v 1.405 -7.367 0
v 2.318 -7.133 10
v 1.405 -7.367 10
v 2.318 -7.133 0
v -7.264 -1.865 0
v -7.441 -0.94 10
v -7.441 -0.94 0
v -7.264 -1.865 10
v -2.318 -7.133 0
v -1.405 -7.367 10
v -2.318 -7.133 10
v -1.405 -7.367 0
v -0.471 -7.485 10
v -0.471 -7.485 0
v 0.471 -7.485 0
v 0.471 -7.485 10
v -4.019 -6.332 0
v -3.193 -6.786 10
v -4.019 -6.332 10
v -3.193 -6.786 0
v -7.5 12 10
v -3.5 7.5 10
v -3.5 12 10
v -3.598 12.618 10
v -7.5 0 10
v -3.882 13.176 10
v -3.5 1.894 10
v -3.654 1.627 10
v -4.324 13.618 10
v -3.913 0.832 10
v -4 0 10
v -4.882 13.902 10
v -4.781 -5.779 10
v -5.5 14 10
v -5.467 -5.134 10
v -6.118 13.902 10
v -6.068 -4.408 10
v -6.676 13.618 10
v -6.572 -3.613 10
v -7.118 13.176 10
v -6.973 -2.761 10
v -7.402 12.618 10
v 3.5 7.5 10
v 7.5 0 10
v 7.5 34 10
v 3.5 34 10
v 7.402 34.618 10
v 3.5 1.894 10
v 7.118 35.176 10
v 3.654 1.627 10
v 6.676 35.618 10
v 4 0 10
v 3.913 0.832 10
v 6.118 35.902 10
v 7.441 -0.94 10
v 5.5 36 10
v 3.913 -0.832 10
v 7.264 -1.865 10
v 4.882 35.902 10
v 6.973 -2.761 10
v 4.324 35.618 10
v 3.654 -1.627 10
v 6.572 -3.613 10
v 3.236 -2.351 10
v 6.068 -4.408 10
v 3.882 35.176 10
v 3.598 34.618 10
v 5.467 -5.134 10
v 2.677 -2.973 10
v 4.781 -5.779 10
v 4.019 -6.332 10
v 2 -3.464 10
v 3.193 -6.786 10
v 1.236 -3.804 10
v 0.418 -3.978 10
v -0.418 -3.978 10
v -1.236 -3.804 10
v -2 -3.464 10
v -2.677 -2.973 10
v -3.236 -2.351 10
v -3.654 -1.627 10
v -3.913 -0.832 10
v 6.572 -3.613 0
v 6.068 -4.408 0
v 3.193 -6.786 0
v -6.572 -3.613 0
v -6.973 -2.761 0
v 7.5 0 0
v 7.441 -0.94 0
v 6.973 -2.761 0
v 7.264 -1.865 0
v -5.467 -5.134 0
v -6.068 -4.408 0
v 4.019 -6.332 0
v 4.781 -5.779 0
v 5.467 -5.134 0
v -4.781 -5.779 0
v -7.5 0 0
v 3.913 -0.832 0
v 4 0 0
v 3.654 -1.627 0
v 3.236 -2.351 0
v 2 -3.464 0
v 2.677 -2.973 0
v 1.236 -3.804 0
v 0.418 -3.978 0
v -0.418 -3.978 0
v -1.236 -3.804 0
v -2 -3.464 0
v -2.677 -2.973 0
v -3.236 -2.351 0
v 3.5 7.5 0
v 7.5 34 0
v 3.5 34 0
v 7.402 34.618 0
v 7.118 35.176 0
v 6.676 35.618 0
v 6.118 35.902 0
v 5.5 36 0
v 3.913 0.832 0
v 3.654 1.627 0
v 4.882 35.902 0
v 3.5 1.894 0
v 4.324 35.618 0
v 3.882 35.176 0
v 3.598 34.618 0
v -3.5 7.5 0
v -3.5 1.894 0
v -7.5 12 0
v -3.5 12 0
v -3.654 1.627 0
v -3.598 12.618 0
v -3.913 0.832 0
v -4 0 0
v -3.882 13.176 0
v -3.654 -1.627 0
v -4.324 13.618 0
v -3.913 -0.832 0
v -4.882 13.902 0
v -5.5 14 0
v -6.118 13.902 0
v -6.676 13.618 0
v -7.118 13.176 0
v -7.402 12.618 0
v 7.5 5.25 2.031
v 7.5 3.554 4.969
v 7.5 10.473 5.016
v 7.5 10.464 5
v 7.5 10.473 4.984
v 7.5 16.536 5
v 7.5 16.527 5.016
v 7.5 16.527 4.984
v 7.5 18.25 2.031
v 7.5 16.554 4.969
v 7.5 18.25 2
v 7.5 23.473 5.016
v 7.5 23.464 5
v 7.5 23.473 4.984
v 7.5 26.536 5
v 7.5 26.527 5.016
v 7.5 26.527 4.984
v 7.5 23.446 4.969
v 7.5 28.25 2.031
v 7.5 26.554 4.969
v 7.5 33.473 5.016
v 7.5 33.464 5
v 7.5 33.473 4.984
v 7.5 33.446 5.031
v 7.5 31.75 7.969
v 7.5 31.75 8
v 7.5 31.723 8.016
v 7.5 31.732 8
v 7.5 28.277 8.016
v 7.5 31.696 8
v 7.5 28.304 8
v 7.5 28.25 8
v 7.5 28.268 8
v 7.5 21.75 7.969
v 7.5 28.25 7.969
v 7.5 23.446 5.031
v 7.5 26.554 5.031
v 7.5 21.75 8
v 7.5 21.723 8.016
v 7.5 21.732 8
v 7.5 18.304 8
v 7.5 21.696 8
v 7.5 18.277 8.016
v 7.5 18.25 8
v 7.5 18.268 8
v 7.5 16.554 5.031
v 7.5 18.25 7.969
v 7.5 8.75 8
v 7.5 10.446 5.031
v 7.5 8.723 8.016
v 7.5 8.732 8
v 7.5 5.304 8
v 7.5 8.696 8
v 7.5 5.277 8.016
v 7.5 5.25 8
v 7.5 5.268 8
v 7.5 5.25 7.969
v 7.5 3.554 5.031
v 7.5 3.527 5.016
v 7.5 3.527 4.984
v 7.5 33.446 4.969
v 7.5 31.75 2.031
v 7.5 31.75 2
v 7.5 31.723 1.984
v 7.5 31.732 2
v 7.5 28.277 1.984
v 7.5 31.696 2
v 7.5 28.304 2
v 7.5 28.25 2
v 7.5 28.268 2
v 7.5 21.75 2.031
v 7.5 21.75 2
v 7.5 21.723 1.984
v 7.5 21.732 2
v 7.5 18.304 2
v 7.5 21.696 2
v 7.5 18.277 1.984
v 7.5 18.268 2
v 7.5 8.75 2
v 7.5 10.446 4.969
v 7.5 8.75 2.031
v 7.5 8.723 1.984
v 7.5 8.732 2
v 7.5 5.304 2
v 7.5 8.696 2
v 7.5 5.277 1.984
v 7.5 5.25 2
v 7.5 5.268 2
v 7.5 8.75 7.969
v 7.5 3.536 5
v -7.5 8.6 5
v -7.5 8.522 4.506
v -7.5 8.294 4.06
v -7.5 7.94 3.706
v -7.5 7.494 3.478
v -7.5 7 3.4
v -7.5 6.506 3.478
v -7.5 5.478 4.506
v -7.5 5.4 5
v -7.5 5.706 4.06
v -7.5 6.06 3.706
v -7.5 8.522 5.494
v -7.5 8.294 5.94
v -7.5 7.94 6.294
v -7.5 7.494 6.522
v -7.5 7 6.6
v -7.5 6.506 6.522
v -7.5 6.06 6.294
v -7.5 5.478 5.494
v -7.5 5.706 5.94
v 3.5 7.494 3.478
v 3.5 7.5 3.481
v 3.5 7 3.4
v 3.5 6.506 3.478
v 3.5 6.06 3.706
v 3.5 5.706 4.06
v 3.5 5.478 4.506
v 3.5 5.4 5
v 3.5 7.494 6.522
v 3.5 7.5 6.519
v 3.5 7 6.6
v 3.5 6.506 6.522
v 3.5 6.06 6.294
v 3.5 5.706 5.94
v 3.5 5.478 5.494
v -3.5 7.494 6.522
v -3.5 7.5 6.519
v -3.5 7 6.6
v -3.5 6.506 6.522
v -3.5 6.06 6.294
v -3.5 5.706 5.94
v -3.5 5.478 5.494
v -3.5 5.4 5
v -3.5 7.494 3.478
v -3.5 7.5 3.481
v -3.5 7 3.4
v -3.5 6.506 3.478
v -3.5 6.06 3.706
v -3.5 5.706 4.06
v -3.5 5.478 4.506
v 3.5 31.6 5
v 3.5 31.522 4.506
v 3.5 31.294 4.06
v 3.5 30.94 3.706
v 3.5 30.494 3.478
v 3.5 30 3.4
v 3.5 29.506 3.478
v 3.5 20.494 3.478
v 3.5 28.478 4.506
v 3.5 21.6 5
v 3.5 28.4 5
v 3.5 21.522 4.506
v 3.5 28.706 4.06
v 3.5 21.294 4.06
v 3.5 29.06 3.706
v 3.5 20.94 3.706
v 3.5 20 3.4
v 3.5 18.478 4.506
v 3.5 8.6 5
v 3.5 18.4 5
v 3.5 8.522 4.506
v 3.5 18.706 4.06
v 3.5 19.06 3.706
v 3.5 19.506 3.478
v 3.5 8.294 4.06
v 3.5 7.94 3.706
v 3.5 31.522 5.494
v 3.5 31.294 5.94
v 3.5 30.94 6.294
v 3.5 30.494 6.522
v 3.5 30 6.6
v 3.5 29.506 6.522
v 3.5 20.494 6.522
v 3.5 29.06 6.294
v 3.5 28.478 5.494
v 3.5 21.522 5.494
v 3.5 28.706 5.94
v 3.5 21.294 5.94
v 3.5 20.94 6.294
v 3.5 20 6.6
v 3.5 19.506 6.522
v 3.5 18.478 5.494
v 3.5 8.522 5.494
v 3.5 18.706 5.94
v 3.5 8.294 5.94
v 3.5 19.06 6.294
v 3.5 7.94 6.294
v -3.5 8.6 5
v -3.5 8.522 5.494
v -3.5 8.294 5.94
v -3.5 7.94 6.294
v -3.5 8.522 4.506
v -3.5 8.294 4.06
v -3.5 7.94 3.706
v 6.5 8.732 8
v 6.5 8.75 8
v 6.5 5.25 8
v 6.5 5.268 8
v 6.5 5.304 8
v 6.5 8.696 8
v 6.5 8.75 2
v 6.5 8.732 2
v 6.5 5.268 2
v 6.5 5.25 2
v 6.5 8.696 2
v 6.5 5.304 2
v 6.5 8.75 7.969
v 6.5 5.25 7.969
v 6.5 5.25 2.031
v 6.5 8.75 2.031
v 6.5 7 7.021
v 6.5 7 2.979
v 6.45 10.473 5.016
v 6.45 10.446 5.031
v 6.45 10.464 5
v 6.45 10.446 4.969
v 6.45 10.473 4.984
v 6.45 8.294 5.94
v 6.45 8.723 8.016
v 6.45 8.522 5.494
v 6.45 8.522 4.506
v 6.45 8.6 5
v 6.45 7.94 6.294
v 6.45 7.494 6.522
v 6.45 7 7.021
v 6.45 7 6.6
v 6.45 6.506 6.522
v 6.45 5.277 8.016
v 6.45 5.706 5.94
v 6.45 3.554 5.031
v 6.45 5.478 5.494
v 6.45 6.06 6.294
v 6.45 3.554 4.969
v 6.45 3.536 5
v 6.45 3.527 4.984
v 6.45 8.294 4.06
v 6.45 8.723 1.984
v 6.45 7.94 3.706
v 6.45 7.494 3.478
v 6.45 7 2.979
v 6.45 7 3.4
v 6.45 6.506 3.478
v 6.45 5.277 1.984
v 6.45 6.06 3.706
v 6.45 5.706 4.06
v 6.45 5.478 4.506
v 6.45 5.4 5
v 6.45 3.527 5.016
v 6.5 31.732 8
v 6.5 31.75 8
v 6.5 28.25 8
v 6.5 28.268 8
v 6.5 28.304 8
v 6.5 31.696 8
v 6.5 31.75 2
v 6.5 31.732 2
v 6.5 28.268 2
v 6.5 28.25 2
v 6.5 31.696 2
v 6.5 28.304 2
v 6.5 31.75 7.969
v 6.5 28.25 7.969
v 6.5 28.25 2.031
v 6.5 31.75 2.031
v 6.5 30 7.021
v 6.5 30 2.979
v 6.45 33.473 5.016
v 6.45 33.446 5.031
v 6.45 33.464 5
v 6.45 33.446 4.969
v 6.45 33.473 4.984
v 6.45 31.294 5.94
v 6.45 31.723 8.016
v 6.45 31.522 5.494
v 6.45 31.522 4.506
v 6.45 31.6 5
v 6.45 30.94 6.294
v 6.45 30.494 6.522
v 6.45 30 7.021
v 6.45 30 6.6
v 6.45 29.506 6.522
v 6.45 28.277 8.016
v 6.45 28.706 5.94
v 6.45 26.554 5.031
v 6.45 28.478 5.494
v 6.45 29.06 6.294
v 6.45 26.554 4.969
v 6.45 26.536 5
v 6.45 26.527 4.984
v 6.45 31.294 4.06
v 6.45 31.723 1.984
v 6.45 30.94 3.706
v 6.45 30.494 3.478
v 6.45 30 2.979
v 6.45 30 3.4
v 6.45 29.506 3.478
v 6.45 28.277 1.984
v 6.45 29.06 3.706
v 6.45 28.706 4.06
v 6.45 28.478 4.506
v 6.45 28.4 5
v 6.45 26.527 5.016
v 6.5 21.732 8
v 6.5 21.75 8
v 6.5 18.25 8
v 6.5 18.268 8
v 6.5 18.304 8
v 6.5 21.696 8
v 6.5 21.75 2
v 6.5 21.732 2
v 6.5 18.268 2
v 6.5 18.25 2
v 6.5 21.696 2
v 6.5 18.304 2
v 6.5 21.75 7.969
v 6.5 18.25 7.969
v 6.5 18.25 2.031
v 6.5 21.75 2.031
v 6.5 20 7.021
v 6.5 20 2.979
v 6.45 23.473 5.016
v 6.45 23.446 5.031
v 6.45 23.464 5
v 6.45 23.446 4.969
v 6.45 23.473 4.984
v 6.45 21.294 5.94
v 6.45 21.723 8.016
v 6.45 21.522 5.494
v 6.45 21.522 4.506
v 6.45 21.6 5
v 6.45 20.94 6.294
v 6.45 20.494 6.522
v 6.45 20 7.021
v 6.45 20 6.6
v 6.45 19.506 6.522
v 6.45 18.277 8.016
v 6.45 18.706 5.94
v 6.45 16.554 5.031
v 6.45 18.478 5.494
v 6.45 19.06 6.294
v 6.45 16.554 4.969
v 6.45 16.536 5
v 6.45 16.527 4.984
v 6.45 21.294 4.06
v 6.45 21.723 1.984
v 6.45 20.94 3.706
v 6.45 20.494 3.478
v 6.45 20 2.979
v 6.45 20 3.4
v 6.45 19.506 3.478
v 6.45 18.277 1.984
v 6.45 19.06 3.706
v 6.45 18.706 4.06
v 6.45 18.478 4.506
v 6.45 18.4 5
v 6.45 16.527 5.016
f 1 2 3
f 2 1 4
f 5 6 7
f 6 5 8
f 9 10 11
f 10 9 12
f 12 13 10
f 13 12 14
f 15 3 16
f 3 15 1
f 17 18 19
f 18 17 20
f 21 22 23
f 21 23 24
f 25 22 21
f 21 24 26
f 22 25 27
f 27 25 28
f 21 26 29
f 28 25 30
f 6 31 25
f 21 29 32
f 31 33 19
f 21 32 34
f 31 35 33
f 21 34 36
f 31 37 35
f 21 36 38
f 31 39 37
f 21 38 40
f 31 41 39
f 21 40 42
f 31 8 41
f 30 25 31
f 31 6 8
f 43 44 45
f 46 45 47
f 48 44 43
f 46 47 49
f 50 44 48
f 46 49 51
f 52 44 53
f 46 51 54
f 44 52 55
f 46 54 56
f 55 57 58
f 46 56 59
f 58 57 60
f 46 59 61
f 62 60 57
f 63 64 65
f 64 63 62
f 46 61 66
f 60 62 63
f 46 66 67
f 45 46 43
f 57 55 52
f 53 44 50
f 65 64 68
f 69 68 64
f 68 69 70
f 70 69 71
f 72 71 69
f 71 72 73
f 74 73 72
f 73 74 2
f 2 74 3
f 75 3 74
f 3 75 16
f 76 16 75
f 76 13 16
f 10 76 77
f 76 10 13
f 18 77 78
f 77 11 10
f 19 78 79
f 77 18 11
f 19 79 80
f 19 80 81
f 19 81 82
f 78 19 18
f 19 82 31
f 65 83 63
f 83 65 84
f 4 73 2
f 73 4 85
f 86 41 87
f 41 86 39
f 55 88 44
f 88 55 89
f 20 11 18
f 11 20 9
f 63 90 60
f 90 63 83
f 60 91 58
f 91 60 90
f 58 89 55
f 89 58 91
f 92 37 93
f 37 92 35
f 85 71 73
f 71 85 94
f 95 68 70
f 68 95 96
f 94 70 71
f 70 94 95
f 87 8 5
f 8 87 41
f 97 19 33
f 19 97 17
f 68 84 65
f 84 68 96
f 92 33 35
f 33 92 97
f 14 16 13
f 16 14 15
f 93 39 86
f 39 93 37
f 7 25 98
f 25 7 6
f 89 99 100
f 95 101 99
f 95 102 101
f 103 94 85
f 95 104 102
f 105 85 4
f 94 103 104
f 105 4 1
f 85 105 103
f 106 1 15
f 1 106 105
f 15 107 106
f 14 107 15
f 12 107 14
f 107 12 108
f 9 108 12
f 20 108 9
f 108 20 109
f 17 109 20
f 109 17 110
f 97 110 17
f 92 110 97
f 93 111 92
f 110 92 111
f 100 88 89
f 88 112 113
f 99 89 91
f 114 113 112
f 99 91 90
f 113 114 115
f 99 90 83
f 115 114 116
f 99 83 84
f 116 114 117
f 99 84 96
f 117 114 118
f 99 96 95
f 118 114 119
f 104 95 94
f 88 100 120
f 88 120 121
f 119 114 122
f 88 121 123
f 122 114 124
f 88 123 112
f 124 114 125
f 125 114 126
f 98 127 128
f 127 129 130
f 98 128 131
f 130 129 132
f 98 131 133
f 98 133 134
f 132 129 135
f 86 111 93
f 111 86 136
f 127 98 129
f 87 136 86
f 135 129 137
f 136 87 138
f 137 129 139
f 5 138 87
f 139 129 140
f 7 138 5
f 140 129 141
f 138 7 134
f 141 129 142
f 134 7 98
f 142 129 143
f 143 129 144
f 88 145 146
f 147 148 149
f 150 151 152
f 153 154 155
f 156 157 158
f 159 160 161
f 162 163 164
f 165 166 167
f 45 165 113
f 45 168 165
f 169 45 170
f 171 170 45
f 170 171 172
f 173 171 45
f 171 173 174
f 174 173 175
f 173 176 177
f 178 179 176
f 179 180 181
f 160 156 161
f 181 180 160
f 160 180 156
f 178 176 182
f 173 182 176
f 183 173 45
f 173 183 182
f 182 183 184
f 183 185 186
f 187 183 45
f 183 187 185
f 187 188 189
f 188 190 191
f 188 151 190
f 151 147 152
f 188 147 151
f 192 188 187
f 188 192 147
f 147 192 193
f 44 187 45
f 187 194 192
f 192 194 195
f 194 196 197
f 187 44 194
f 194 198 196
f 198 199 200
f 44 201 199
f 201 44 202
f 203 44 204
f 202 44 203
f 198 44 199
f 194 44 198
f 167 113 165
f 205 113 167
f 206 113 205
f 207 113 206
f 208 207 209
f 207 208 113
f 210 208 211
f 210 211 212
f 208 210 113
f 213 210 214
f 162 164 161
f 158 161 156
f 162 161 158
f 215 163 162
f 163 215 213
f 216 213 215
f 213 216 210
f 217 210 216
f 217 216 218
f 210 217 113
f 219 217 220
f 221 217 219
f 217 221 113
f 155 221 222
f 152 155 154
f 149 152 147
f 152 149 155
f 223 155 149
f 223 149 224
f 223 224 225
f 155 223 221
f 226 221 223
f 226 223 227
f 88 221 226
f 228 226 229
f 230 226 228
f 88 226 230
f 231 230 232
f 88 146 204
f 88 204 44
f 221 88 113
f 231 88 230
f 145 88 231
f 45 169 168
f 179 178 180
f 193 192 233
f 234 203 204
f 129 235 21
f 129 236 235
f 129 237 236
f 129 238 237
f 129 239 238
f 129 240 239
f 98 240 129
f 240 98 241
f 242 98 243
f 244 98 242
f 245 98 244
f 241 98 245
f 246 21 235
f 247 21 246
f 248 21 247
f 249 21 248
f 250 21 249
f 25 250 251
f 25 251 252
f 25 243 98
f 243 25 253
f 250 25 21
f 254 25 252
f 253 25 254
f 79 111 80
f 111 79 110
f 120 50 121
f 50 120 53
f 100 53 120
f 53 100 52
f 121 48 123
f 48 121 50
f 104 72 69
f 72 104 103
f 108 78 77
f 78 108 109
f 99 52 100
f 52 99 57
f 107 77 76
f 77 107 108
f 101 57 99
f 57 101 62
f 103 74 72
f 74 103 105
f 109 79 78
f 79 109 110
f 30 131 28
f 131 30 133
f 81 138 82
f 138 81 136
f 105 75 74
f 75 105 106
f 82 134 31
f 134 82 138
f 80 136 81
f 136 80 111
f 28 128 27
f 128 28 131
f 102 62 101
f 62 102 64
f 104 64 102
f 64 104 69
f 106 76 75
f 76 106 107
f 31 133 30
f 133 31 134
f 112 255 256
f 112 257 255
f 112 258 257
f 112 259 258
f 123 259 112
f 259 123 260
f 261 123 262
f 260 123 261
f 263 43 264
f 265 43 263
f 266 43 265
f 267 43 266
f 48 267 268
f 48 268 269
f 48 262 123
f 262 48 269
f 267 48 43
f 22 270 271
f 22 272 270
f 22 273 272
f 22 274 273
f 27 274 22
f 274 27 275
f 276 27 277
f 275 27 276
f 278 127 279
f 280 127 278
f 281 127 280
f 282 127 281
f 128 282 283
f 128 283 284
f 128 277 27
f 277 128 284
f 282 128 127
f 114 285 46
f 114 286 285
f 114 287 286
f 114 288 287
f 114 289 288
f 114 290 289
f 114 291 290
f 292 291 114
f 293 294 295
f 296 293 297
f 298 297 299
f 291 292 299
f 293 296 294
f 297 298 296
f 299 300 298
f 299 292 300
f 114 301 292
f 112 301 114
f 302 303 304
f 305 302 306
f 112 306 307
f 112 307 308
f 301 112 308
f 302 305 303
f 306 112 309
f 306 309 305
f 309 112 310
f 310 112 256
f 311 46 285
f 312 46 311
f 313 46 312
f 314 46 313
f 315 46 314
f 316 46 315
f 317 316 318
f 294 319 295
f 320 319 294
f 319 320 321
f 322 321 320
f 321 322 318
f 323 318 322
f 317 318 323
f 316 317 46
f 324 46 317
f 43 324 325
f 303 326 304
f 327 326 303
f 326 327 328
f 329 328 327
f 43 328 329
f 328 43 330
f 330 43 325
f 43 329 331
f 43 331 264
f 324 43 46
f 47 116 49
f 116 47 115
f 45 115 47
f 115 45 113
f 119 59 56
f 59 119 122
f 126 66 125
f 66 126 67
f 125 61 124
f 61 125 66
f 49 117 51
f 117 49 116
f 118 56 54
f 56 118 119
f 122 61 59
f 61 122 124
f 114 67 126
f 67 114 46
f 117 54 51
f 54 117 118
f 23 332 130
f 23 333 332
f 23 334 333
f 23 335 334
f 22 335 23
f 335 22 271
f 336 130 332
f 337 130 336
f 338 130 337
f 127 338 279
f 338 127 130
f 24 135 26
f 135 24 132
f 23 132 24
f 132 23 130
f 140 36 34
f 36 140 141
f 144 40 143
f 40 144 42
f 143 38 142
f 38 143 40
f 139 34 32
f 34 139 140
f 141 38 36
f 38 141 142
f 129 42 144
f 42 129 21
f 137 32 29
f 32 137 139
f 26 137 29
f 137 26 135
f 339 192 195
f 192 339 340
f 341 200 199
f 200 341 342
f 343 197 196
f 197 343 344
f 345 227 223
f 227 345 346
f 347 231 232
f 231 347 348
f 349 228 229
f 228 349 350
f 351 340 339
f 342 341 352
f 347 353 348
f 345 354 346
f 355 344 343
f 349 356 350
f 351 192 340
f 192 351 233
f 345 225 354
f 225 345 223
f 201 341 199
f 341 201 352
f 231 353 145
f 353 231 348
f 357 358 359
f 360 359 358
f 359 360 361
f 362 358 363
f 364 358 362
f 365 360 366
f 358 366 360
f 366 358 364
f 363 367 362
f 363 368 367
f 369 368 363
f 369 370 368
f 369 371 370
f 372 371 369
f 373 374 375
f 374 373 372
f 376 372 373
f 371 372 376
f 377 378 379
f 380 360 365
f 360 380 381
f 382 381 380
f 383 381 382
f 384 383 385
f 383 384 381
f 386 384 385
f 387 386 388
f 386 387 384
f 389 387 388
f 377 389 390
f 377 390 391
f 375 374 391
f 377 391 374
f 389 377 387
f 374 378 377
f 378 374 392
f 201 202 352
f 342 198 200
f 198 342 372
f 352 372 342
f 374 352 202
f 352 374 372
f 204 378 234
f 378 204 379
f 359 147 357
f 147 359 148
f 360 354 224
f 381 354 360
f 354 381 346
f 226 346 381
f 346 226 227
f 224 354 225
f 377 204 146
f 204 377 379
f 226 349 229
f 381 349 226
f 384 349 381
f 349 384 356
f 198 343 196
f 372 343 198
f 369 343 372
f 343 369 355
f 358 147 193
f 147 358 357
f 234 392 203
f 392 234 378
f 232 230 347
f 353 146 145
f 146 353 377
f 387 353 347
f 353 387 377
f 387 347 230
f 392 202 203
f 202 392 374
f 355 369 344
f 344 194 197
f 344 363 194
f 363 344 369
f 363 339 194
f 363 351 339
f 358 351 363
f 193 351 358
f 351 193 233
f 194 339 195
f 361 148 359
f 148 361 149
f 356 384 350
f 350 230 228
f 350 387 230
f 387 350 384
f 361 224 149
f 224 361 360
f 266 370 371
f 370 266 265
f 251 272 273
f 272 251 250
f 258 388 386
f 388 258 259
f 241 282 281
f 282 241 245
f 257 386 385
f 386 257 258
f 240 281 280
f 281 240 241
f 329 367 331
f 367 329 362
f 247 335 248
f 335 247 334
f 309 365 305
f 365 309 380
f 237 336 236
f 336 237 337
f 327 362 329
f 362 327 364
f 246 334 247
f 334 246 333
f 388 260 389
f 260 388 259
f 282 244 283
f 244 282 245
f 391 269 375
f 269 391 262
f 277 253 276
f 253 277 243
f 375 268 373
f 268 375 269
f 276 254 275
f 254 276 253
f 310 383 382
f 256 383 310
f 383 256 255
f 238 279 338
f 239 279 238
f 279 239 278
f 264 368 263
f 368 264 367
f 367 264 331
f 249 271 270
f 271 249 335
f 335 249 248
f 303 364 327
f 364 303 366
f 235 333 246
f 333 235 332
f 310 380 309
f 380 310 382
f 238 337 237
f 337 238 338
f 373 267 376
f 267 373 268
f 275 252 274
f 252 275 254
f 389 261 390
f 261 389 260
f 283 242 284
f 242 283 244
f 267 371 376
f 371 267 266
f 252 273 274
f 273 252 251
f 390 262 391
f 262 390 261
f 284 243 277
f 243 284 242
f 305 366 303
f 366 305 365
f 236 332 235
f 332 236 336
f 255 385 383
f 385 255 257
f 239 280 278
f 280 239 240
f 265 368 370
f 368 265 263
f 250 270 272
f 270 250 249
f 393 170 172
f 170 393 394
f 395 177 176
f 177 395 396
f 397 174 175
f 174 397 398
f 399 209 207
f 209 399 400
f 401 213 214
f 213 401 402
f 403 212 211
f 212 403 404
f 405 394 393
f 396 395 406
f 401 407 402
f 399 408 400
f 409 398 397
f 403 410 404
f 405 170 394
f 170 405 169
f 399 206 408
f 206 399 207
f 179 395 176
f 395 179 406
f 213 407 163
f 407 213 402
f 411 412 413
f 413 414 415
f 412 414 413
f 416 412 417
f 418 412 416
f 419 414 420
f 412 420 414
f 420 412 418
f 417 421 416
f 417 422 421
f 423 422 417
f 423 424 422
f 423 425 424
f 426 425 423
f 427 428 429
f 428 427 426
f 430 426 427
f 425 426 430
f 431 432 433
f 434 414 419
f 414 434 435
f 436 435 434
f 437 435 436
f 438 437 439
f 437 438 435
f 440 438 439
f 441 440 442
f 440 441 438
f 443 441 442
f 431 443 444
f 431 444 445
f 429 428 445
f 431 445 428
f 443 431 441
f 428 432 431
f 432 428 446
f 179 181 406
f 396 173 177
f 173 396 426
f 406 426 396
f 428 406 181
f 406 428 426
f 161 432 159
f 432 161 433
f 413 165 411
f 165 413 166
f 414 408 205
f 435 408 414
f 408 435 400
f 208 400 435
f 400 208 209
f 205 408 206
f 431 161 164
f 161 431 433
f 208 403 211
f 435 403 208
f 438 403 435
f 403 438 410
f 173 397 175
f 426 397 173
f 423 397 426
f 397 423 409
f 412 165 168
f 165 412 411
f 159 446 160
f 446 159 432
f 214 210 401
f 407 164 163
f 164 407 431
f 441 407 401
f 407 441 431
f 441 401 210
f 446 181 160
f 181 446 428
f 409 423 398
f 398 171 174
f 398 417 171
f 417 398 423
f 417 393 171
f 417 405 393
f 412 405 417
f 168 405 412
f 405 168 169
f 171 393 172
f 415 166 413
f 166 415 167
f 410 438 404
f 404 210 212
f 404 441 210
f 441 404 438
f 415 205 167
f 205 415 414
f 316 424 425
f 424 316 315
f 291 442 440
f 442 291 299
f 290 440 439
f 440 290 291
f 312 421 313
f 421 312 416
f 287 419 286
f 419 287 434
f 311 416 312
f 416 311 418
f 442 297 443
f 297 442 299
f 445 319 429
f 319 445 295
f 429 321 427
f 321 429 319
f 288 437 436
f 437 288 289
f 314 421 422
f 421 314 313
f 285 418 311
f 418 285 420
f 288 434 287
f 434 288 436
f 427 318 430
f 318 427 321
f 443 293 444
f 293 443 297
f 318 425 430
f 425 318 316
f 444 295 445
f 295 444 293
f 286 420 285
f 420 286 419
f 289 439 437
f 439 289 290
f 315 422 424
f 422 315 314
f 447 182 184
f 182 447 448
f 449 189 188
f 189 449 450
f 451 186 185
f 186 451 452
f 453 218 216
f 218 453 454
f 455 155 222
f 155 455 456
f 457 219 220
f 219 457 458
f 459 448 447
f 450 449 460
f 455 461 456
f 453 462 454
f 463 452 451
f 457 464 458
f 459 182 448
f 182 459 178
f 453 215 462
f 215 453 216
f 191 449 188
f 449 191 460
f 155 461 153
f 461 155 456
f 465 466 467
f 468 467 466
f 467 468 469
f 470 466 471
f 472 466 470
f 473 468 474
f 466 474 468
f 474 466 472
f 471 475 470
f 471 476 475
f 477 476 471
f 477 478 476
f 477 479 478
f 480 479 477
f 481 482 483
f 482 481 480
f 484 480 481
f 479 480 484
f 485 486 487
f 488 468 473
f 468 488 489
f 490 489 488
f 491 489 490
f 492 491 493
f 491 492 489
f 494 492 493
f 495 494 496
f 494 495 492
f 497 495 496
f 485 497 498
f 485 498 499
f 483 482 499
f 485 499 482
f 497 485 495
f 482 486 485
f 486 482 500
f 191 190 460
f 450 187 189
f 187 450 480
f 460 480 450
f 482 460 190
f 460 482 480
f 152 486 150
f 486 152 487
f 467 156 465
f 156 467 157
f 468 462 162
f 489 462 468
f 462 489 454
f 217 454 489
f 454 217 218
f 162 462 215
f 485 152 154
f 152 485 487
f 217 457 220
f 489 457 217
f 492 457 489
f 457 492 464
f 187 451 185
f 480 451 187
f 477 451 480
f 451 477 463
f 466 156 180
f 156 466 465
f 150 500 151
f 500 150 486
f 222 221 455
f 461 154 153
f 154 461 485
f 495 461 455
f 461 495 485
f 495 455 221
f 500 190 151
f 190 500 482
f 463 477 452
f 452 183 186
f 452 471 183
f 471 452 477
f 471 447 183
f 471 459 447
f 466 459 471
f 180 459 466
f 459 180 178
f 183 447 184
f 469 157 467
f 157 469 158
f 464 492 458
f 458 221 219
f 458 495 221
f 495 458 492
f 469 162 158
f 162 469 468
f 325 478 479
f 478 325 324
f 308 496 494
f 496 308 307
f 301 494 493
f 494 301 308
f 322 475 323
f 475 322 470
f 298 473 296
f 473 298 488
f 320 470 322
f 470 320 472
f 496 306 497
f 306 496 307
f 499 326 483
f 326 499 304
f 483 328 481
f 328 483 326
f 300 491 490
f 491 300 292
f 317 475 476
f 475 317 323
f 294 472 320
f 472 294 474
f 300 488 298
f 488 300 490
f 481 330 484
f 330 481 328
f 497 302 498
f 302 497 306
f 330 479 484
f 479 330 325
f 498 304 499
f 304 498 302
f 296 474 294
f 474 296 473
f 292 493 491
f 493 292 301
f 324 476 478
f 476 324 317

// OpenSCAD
rodDiameter = 8;
mainWall = 4;
height = 10;
endstopSpacing = 10;

module mainCurve(rod = 8, wall = 4, h = 10) {
	extra = 0.5;
	curveWall = wall - extra;
	innerRad = rod/2;
	outerRad = (innerRad + curveWall);
	difference() {
		union() {
			cylinder(h=h, r = outerRad, $fn=50);
			translate([-outerRad,0,0]) cube([2*outerRad,outerRad,h]);
		}
		translate([0,0,-0.1]) cylinder(h=(h+0.2), r = innerRad, $fn=30);
		translate([-innerRad+extra, 0, -0.1]) cube([rod-2*extra, outerRad+0.1, (h+0.2)]);
	}
}

module leg(length = 32, thickness = 4, h = 10) {
	wallThickness = thickness - 0.5;
	cube([thickness, length, h]);
	translate([thickness/2, length, 0]) cylinder(h=h, r=(thickness/2), $fn=20);
}

module m3withTolerance(length = 30) {
	union() {
		cube([2,3.5,6], center=true);
		rotate([60,0,0]) cube([2.1,3.5,6], center=true);
		rotate([120,0,0]) cube([2.1,3.5,6], center=true);
		rotate([0, 90, 180]) cylinder(h = length + 0.1, r = 1.6, $fn= 20);
	}
}

module mainBody(wall = 4, rod = 8, h = 10) {
	wallThickness = wall - 0.5;
	innerRadius = rod/2;
	outerRadius = (innerRadius + wallThickness);
	shortLeg = rod/2 + 8;
	longLeg = shortLeg + 12 + endstopSpacing;
	
	difference() {
		//the body of the holder
		union() {
			mainCurve(rod, wall, h);
			
			translate([outerRadius - wall, outerRadius,0]) 
				leg(longLeg - outerRadius, wall, h);
			
			translate([-outerRadius,outerRadius,0])
				leg(shortLeg - outerRadius, wall, h);
		}
		//holes for m3 screws with spaces for nuts
		color([1,0,0]) {
			translate([outerRadius,shortLeg - 5,height - 5])
				m3withTolerance(outerRadius*2);
		
			translate([outerRadius,longLeg - 4,height - 5])
				m3withTolerance(outerRadius*2);
			translate([outerRadius,longLeg - 4 - endstopSpacing,height - 5])
				m3withTolerance(outerRadius*2);
		}
	}
}

mainBody(mainWall, rodDiameter, height);
